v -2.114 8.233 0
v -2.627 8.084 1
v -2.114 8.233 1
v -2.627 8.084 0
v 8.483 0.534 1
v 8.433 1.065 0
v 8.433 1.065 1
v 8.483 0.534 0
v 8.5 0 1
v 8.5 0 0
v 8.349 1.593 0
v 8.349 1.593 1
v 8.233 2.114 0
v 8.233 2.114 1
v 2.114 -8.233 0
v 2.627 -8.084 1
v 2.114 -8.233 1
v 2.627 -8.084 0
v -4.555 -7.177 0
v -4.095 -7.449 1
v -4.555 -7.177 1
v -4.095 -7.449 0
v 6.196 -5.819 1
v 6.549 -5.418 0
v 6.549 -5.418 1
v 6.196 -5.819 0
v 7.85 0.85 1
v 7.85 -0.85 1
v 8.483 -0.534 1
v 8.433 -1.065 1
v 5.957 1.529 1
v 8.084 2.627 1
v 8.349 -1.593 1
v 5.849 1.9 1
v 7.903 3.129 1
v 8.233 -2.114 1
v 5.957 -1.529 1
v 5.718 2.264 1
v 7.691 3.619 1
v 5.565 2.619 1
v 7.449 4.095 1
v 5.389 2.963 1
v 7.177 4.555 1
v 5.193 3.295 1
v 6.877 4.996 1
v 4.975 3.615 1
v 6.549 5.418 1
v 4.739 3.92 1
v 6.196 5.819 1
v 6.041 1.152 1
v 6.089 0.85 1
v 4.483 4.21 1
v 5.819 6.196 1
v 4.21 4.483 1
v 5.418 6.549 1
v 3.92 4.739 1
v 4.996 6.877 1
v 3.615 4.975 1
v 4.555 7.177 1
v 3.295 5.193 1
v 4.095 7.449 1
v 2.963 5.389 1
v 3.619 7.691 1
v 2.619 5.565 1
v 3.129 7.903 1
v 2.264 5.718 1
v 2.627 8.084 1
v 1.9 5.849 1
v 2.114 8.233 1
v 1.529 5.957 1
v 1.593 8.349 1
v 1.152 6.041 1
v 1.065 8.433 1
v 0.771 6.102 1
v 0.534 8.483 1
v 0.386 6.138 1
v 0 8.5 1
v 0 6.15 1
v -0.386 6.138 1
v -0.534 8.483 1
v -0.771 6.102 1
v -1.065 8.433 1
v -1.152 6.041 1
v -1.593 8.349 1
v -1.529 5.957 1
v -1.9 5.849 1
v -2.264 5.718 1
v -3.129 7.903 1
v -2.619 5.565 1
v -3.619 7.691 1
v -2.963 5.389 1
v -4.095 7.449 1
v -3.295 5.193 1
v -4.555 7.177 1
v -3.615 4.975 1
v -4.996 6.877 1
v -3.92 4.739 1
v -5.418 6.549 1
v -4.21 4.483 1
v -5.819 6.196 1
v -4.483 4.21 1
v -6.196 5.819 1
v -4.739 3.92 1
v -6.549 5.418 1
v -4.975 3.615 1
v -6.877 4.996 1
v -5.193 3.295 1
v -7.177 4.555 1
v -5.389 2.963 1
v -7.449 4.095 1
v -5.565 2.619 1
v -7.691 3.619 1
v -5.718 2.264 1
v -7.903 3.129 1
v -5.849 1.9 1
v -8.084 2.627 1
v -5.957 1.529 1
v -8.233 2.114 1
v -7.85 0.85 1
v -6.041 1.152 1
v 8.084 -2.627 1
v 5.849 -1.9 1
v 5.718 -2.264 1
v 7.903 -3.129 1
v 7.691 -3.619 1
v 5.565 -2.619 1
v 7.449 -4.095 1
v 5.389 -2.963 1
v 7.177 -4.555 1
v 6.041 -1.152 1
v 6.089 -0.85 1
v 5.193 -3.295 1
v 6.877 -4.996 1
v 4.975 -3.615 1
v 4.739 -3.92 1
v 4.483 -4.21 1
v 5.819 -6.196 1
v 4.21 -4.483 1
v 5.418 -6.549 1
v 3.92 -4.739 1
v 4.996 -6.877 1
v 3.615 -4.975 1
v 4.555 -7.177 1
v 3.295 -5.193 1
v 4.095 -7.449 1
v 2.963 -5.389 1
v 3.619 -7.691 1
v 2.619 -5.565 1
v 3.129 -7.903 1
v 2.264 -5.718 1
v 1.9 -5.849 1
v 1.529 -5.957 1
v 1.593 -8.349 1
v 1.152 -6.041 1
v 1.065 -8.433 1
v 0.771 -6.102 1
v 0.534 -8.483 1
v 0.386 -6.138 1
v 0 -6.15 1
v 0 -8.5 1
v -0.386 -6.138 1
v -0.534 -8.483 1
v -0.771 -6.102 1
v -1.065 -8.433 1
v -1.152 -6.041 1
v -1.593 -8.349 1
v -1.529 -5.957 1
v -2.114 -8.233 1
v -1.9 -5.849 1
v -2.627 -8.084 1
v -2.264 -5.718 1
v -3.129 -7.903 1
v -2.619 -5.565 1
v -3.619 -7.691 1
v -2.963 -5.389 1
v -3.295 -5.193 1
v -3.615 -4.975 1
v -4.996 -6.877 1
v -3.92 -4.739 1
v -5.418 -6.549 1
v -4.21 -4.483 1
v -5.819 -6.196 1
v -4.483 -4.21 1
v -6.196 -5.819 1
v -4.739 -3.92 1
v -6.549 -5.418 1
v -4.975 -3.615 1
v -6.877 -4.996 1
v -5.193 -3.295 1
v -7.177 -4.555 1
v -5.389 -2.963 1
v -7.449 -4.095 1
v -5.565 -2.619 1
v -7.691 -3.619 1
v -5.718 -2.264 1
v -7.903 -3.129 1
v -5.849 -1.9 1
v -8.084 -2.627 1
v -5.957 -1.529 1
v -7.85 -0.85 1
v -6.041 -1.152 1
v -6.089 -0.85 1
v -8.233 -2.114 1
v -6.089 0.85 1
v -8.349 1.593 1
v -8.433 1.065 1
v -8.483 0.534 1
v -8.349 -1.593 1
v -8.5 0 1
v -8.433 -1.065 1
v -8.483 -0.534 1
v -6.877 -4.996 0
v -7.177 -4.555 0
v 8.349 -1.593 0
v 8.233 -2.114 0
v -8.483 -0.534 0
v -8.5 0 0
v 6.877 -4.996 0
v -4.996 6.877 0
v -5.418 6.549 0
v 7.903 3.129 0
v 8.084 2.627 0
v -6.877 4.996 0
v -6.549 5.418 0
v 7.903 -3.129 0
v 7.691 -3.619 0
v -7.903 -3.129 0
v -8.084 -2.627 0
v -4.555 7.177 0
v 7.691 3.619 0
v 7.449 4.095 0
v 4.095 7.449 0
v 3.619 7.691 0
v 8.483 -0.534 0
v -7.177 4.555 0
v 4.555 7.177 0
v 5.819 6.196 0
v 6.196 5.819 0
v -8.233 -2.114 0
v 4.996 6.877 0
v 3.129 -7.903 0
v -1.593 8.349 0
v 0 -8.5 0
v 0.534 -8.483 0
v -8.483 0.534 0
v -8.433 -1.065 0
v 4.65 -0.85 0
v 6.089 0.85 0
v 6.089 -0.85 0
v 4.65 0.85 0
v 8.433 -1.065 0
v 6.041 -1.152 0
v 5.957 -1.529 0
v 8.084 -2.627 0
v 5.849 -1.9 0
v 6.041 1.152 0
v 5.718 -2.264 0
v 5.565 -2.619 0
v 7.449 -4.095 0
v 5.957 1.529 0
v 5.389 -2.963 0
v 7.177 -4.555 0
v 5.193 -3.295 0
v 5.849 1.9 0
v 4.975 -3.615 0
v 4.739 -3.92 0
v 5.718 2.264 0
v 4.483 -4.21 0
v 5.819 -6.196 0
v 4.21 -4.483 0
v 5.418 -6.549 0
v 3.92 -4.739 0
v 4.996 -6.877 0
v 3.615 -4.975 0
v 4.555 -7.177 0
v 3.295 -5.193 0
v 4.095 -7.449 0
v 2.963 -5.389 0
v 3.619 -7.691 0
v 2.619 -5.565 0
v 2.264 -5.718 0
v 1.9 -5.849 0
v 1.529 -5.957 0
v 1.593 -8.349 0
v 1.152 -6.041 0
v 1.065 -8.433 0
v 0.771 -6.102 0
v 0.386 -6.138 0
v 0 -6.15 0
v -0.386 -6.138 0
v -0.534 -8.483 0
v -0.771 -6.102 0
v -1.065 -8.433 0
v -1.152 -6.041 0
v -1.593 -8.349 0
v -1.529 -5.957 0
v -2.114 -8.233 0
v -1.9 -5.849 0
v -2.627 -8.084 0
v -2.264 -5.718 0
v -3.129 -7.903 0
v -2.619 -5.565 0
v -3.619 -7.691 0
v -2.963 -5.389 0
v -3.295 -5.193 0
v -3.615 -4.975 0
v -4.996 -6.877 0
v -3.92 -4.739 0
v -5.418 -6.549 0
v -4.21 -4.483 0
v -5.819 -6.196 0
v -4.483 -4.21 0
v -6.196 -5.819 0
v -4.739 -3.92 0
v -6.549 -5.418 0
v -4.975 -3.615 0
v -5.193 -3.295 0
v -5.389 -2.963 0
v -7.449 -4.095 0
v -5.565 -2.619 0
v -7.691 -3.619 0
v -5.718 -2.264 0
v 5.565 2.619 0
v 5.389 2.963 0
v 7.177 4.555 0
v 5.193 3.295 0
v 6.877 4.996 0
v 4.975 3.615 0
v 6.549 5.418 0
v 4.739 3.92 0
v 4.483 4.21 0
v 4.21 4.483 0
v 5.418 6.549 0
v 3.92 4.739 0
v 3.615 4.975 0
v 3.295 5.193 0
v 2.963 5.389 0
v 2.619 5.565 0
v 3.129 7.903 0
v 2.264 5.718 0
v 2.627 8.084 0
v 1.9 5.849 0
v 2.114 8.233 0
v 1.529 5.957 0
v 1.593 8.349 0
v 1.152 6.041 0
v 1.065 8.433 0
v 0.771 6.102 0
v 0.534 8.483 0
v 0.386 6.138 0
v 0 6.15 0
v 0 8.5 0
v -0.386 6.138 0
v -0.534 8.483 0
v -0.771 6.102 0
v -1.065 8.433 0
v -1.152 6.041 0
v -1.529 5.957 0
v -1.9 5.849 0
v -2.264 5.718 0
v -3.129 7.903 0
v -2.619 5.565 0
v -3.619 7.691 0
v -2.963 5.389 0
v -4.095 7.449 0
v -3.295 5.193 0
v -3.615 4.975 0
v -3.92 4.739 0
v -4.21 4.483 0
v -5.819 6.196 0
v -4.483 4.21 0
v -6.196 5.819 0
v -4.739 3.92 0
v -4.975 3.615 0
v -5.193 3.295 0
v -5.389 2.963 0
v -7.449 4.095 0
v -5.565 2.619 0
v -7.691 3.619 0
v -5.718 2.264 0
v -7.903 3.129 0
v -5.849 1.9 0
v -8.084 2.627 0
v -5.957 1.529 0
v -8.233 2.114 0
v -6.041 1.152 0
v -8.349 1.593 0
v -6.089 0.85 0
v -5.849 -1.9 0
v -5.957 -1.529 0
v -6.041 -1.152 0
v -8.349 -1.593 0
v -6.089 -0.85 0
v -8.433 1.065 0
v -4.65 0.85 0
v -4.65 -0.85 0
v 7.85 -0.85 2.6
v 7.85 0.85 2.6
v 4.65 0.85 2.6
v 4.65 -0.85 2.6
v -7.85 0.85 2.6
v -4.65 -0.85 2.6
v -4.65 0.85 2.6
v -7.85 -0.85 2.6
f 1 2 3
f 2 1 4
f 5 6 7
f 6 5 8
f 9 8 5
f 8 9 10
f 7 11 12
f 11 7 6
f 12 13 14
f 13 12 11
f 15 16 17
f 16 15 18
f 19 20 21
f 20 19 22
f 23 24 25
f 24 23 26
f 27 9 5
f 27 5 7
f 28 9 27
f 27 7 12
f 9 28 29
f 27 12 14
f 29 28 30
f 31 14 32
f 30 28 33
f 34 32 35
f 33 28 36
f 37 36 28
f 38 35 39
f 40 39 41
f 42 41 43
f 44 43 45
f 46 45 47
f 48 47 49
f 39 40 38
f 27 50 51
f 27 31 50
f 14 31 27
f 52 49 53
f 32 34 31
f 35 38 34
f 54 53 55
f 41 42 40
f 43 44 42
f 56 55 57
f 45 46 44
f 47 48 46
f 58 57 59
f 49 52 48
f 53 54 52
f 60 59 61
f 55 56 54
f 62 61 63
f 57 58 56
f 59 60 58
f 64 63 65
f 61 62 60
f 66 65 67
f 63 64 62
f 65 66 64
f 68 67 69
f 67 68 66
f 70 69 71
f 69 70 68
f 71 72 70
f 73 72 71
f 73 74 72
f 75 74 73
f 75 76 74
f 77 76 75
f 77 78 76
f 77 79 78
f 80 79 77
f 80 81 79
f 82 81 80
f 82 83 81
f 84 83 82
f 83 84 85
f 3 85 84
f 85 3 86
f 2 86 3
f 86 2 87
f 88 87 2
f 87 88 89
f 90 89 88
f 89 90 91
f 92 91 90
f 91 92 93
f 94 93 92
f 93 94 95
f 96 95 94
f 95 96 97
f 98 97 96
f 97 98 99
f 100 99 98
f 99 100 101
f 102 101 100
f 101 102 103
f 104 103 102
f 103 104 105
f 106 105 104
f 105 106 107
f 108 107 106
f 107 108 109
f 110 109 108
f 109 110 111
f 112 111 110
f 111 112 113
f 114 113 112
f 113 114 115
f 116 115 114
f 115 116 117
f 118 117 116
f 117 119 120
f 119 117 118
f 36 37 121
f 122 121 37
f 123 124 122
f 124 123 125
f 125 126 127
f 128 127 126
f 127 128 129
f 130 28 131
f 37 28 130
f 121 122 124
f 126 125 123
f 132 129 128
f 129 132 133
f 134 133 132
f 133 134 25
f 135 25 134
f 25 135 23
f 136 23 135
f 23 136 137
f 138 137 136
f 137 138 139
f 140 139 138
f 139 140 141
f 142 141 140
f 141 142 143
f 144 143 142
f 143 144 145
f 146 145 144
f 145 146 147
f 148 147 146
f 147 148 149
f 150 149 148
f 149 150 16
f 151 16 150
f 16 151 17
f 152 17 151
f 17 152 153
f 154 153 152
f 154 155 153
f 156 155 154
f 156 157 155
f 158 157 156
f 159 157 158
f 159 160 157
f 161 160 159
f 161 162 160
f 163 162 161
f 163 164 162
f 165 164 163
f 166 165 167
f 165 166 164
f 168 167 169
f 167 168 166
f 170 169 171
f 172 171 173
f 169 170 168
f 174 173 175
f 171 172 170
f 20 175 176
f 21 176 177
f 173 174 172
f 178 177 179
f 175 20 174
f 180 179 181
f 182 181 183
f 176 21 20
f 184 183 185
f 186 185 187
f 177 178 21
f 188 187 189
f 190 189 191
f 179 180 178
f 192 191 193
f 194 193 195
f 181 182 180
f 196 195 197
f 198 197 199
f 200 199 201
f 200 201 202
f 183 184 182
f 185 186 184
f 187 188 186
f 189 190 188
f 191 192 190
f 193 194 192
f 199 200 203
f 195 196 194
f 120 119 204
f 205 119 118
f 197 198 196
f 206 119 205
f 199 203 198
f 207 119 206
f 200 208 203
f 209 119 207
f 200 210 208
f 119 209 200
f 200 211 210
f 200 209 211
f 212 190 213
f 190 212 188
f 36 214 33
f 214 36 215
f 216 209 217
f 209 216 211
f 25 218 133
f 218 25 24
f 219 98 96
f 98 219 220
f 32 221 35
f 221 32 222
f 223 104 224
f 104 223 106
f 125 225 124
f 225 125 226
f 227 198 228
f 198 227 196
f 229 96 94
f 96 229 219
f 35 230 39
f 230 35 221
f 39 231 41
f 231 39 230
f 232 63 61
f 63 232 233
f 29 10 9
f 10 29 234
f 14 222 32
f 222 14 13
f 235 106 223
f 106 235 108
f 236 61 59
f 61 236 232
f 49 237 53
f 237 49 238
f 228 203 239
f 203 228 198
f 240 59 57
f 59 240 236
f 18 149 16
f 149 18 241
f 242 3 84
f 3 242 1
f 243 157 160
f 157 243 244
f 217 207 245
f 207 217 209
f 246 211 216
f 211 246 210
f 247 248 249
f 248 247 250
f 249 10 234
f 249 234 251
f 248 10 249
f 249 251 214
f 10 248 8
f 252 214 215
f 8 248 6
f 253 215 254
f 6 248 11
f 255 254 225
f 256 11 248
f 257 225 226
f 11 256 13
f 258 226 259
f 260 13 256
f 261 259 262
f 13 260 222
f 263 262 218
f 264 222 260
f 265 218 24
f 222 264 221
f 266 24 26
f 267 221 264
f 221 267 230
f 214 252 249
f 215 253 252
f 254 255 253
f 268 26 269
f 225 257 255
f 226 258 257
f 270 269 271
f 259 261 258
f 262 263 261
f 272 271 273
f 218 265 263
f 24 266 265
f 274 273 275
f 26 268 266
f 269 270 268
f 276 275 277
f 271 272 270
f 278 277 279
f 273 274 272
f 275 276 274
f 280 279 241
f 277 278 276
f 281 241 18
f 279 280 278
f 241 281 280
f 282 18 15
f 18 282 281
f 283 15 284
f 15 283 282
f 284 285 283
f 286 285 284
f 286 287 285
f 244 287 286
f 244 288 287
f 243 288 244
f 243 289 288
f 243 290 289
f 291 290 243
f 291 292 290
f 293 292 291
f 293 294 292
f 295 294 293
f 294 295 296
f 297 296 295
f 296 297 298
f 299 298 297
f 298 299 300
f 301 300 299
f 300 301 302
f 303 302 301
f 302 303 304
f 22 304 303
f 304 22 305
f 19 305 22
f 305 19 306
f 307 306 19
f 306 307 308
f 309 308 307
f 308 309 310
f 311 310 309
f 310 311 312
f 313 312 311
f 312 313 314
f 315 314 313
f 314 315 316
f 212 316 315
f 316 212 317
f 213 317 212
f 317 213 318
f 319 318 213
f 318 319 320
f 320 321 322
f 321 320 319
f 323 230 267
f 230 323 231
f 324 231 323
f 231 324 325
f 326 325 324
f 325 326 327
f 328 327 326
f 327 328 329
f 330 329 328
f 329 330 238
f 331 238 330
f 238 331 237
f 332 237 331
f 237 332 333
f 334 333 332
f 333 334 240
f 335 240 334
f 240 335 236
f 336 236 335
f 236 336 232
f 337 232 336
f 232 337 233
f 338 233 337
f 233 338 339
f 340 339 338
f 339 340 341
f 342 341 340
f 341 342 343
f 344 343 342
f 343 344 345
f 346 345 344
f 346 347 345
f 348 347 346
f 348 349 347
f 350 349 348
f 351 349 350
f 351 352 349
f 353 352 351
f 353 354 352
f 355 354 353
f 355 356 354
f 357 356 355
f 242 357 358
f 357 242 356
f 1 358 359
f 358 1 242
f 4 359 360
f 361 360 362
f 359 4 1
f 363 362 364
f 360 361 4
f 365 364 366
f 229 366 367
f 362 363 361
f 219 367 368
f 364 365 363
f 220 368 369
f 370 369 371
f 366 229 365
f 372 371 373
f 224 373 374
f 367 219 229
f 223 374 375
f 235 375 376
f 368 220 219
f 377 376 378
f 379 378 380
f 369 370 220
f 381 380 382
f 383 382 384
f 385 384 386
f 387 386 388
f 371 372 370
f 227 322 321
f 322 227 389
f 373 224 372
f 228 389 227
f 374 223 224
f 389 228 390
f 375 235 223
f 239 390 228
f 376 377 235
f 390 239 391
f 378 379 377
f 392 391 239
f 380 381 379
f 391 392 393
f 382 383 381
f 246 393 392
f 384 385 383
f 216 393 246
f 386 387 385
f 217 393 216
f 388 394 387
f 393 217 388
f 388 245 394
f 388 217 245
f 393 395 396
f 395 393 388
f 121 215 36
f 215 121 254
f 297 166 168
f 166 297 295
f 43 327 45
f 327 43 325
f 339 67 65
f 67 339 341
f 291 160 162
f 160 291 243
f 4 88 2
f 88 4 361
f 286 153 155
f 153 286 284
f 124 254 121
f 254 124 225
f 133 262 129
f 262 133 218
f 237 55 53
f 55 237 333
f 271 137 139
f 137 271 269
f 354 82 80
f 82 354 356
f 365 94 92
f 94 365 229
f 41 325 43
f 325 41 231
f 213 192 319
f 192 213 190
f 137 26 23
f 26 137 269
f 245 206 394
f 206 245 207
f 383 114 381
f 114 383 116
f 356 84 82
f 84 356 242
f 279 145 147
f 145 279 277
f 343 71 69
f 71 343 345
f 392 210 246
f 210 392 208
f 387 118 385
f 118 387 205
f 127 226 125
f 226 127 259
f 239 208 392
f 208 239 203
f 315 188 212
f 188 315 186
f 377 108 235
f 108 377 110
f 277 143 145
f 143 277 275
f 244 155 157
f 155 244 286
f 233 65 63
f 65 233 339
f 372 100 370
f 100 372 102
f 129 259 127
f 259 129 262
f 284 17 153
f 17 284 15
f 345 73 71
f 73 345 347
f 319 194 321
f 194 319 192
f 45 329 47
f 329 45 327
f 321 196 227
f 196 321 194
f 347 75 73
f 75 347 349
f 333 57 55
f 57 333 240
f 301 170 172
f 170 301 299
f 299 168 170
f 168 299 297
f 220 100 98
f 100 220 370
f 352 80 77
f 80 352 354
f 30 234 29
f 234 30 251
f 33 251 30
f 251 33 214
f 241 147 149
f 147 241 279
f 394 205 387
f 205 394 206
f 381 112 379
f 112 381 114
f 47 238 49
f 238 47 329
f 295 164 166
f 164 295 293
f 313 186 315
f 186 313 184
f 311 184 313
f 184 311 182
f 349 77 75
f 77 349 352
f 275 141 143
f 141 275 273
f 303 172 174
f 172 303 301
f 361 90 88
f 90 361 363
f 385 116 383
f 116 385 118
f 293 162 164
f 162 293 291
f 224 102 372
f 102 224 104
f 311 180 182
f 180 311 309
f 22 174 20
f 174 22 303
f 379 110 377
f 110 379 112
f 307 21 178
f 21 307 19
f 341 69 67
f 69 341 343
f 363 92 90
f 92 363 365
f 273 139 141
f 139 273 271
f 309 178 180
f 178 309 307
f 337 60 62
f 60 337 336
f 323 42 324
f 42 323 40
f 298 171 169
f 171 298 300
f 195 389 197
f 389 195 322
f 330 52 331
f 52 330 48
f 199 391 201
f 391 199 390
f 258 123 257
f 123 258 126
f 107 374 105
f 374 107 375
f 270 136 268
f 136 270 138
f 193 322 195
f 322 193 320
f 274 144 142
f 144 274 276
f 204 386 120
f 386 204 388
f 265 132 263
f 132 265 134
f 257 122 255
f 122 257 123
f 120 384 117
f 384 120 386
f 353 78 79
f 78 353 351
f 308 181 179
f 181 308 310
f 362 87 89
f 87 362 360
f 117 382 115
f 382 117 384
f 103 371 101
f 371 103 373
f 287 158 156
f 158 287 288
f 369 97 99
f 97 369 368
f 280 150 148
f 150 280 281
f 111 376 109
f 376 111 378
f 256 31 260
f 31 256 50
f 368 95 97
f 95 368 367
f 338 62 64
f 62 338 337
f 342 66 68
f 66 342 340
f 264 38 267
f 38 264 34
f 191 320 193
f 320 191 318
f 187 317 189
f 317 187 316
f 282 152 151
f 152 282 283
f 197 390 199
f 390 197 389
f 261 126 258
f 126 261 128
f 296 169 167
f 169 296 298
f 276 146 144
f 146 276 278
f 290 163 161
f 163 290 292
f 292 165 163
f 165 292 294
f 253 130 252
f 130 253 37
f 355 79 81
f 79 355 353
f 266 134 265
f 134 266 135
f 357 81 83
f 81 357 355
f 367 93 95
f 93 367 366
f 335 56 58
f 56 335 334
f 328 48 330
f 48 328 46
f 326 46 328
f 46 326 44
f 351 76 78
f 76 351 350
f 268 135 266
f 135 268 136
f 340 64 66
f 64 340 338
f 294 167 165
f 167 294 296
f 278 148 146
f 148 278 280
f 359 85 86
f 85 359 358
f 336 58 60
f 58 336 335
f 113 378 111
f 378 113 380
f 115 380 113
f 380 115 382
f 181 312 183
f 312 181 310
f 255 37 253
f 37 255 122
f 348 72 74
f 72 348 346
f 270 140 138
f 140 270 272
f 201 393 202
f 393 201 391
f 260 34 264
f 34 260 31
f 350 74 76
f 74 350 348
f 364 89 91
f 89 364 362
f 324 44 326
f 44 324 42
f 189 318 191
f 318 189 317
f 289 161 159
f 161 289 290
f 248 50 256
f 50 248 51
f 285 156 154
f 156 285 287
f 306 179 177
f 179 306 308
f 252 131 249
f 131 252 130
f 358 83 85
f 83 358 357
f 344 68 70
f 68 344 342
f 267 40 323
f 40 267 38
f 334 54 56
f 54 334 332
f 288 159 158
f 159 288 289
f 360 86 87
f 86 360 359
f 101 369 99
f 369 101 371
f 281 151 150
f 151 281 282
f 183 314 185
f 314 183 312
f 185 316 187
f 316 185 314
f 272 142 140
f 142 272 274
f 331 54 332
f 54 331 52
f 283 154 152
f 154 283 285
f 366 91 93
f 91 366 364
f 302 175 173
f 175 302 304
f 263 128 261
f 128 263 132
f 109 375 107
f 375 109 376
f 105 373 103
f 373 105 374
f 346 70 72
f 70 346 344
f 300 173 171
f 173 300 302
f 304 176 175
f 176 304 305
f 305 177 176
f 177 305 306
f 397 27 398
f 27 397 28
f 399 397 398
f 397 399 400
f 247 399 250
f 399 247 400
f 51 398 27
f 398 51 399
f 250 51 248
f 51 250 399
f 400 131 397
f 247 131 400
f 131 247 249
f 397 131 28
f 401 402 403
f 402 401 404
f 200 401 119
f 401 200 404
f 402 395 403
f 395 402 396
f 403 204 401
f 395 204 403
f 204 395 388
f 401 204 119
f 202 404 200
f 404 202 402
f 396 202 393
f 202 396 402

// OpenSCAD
$fn=100;

module rotor1_4() {
    margin = 0.3;
    thread_diameter = 12 + margin;
    height = 1;
    difference() {
        translate([0, 0, height/2])
        cylinder(r=17/2,h=height,center=true);
        cylinder(r=thread_diameter/2,h=100,center=true);
    }
    for(i=[0:1])
    {
        mirror([i,0,0])
        translate([3.5/2+9/2,0,(height+1.6)/2])
        cube([3.5-0.3,2-0.3,height+1.6], center=true);
    }
}
rotor1_4();
